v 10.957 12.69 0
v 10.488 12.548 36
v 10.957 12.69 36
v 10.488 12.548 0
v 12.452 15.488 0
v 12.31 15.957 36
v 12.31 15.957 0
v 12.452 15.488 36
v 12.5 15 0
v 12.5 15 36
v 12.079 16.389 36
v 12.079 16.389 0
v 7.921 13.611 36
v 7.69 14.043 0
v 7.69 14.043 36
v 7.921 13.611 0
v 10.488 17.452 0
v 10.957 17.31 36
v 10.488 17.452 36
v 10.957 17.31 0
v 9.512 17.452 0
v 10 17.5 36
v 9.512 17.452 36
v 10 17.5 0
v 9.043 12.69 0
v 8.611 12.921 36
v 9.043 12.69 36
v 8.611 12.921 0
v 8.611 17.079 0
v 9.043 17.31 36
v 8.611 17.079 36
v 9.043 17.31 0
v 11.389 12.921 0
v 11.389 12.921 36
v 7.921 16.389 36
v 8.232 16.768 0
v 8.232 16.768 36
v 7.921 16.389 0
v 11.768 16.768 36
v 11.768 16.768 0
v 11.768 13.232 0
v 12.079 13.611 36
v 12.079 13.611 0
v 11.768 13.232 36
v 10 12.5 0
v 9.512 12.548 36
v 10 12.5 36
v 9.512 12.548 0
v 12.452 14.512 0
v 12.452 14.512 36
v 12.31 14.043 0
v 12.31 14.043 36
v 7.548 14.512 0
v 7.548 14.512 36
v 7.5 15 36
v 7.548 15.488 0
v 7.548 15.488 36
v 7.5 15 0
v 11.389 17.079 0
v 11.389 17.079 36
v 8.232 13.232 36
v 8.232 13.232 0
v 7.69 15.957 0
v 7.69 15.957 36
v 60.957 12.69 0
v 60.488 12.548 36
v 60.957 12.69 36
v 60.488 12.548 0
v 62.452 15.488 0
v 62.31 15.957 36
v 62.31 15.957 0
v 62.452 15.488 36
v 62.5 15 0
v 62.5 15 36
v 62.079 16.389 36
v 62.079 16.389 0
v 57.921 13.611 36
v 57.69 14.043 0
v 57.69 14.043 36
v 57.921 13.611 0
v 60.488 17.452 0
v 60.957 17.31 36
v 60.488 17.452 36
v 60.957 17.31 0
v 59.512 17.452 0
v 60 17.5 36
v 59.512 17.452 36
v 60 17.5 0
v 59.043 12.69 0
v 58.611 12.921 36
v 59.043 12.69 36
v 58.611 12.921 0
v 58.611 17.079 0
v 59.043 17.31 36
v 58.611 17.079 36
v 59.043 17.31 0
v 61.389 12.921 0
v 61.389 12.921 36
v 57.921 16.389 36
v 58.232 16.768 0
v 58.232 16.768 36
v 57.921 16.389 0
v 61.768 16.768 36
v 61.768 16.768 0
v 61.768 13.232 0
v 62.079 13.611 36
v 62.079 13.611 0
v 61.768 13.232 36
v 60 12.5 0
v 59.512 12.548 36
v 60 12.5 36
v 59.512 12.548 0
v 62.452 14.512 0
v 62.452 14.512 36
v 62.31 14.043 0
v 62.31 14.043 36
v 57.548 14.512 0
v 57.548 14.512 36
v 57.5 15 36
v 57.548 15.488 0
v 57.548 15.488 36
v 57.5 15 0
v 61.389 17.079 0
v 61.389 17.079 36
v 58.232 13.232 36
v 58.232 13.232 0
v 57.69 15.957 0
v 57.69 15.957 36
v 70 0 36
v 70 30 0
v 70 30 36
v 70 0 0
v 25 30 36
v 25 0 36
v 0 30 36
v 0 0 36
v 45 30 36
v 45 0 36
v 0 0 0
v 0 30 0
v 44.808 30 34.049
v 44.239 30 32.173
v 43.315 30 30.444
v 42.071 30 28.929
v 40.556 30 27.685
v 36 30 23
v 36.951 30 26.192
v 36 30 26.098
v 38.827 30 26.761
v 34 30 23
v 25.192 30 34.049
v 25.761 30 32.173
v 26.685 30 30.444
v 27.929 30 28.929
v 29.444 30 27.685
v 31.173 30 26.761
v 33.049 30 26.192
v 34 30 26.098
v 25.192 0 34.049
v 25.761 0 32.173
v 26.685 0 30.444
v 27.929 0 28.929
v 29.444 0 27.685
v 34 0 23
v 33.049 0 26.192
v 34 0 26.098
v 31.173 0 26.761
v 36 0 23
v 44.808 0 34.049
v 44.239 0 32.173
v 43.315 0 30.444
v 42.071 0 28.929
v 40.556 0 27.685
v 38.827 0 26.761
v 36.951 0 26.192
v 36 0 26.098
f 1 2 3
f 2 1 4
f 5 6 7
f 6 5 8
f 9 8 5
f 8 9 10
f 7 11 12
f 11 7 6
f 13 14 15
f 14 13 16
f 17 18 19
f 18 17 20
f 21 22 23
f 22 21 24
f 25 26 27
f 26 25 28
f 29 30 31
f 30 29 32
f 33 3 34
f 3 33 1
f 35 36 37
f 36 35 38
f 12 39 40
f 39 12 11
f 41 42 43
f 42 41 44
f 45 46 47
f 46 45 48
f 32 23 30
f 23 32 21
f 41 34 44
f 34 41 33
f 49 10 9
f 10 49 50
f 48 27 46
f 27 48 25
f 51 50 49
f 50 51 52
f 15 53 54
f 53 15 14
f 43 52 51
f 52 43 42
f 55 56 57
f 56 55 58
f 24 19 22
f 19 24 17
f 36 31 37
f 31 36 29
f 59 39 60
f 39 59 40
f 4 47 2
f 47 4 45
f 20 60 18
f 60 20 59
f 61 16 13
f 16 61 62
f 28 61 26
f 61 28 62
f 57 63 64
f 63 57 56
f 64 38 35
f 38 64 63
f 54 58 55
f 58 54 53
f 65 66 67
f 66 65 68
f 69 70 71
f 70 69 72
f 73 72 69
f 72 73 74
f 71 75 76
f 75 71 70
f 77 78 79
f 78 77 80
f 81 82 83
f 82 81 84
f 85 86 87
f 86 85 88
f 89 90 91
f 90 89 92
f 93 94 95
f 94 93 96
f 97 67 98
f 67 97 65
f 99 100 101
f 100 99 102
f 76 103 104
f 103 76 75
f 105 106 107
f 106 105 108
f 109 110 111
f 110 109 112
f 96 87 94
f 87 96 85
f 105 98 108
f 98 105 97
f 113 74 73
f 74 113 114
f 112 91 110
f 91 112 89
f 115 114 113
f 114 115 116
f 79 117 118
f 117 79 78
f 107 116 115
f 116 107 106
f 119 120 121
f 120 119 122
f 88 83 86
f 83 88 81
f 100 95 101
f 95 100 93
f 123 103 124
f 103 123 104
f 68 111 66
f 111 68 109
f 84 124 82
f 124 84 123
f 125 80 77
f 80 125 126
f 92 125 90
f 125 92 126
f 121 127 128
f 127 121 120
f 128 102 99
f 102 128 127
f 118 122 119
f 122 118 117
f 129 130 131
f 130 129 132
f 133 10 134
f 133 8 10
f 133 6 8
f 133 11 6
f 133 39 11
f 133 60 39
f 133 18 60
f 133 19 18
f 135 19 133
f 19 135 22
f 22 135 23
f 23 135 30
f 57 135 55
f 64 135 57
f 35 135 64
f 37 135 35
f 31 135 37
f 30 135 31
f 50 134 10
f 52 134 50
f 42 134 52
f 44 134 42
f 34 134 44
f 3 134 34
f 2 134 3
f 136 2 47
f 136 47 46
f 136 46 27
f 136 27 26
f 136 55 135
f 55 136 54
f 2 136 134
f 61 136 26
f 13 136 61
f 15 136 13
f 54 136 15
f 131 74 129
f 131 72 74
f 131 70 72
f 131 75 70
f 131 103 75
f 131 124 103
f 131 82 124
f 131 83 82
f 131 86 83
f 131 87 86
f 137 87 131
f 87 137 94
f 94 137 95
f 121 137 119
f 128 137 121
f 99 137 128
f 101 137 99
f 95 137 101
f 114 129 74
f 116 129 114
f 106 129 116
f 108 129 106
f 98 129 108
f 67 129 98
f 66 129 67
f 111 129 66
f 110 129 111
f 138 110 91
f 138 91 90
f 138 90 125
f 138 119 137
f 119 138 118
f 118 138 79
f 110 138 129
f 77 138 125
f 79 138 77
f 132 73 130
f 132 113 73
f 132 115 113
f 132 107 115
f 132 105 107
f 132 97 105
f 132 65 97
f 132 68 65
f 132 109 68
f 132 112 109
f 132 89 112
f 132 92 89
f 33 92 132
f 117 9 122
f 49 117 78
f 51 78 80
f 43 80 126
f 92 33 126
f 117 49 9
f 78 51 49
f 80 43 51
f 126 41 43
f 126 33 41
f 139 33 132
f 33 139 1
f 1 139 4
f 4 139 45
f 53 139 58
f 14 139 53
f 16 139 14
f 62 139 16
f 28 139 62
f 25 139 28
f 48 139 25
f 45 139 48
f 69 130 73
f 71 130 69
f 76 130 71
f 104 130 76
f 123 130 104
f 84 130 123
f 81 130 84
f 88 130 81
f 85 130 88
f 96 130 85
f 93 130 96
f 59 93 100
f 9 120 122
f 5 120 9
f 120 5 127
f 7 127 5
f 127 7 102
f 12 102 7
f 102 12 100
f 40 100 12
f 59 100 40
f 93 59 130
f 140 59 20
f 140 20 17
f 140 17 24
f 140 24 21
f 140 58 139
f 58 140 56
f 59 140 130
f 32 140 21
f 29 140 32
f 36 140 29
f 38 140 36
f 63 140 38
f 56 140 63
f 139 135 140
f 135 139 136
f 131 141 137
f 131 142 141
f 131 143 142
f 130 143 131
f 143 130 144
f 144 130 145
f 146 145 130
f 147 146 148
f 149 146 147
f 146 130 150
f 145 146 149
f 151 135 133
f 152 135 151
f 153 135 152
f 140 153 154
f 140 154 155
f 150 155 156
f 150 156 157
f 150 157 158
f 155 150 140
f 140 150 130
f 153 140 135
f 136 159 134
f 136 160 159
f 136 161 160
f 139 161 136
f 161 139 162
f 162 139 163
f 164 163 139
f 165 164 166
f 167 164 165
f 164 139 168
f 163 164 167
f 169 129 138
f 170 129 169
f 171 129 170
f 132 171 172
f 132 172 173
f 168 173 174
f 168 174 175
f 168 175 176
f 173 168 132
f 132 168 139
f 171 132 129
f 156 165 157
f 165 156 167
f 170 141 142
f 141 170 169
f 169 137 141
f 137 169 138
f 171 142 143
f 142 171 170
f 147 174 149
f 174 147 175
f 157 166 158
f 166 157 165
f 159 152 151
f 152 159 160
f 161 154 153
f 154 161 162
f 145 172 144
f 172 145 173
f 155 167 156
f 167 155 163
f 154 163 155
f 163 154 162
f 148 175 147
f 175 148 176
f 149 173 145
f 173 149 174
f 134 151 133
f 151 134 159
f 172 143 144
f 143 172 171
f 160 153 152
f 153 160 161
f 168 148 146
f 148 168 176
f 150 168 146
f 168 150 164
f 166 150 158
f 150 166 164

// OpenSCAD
$fn = 32;

// ----------------------------------------------------------------------
// Saddle clamp: split shaft clamp
// ----------------------------------------------------------------------

// --- parameters (mm) ---
blk_l = 70;               // block length, X
blk_w = 30;               // block width, Y
blk_h = 36;               // block height
clamp_r = 10;             // shaft groove radius
hole_r = 2.5;             // bolt hole radius
hole_m = 10;              // bolt hole margin from the ends
saw_w = 2;                // saw kerf width

saw_depth = clamp_r + 3;  // saw kerf depth

difference() {
  cube([blk_l, blk_w, blk_h]);
  translate([blk_l / 2, -1, blk_h])
    rotate([-90, 0, 0])
      cylinder(h = blk_w + 2, r = clamp_r);
  for (sx = [0, 1])
    translate([sx ? blk_l - hole_m : hole_m, blk_w / 2, -1])
      cylinder(r = hole_r, h = blk_h + 2);
  translate([blk_l / 2 - saw_w / 2, -1, blk_h - saw_depth])
    cube([saw_w, blk_w + 2, saw_depth + 1]);
}
